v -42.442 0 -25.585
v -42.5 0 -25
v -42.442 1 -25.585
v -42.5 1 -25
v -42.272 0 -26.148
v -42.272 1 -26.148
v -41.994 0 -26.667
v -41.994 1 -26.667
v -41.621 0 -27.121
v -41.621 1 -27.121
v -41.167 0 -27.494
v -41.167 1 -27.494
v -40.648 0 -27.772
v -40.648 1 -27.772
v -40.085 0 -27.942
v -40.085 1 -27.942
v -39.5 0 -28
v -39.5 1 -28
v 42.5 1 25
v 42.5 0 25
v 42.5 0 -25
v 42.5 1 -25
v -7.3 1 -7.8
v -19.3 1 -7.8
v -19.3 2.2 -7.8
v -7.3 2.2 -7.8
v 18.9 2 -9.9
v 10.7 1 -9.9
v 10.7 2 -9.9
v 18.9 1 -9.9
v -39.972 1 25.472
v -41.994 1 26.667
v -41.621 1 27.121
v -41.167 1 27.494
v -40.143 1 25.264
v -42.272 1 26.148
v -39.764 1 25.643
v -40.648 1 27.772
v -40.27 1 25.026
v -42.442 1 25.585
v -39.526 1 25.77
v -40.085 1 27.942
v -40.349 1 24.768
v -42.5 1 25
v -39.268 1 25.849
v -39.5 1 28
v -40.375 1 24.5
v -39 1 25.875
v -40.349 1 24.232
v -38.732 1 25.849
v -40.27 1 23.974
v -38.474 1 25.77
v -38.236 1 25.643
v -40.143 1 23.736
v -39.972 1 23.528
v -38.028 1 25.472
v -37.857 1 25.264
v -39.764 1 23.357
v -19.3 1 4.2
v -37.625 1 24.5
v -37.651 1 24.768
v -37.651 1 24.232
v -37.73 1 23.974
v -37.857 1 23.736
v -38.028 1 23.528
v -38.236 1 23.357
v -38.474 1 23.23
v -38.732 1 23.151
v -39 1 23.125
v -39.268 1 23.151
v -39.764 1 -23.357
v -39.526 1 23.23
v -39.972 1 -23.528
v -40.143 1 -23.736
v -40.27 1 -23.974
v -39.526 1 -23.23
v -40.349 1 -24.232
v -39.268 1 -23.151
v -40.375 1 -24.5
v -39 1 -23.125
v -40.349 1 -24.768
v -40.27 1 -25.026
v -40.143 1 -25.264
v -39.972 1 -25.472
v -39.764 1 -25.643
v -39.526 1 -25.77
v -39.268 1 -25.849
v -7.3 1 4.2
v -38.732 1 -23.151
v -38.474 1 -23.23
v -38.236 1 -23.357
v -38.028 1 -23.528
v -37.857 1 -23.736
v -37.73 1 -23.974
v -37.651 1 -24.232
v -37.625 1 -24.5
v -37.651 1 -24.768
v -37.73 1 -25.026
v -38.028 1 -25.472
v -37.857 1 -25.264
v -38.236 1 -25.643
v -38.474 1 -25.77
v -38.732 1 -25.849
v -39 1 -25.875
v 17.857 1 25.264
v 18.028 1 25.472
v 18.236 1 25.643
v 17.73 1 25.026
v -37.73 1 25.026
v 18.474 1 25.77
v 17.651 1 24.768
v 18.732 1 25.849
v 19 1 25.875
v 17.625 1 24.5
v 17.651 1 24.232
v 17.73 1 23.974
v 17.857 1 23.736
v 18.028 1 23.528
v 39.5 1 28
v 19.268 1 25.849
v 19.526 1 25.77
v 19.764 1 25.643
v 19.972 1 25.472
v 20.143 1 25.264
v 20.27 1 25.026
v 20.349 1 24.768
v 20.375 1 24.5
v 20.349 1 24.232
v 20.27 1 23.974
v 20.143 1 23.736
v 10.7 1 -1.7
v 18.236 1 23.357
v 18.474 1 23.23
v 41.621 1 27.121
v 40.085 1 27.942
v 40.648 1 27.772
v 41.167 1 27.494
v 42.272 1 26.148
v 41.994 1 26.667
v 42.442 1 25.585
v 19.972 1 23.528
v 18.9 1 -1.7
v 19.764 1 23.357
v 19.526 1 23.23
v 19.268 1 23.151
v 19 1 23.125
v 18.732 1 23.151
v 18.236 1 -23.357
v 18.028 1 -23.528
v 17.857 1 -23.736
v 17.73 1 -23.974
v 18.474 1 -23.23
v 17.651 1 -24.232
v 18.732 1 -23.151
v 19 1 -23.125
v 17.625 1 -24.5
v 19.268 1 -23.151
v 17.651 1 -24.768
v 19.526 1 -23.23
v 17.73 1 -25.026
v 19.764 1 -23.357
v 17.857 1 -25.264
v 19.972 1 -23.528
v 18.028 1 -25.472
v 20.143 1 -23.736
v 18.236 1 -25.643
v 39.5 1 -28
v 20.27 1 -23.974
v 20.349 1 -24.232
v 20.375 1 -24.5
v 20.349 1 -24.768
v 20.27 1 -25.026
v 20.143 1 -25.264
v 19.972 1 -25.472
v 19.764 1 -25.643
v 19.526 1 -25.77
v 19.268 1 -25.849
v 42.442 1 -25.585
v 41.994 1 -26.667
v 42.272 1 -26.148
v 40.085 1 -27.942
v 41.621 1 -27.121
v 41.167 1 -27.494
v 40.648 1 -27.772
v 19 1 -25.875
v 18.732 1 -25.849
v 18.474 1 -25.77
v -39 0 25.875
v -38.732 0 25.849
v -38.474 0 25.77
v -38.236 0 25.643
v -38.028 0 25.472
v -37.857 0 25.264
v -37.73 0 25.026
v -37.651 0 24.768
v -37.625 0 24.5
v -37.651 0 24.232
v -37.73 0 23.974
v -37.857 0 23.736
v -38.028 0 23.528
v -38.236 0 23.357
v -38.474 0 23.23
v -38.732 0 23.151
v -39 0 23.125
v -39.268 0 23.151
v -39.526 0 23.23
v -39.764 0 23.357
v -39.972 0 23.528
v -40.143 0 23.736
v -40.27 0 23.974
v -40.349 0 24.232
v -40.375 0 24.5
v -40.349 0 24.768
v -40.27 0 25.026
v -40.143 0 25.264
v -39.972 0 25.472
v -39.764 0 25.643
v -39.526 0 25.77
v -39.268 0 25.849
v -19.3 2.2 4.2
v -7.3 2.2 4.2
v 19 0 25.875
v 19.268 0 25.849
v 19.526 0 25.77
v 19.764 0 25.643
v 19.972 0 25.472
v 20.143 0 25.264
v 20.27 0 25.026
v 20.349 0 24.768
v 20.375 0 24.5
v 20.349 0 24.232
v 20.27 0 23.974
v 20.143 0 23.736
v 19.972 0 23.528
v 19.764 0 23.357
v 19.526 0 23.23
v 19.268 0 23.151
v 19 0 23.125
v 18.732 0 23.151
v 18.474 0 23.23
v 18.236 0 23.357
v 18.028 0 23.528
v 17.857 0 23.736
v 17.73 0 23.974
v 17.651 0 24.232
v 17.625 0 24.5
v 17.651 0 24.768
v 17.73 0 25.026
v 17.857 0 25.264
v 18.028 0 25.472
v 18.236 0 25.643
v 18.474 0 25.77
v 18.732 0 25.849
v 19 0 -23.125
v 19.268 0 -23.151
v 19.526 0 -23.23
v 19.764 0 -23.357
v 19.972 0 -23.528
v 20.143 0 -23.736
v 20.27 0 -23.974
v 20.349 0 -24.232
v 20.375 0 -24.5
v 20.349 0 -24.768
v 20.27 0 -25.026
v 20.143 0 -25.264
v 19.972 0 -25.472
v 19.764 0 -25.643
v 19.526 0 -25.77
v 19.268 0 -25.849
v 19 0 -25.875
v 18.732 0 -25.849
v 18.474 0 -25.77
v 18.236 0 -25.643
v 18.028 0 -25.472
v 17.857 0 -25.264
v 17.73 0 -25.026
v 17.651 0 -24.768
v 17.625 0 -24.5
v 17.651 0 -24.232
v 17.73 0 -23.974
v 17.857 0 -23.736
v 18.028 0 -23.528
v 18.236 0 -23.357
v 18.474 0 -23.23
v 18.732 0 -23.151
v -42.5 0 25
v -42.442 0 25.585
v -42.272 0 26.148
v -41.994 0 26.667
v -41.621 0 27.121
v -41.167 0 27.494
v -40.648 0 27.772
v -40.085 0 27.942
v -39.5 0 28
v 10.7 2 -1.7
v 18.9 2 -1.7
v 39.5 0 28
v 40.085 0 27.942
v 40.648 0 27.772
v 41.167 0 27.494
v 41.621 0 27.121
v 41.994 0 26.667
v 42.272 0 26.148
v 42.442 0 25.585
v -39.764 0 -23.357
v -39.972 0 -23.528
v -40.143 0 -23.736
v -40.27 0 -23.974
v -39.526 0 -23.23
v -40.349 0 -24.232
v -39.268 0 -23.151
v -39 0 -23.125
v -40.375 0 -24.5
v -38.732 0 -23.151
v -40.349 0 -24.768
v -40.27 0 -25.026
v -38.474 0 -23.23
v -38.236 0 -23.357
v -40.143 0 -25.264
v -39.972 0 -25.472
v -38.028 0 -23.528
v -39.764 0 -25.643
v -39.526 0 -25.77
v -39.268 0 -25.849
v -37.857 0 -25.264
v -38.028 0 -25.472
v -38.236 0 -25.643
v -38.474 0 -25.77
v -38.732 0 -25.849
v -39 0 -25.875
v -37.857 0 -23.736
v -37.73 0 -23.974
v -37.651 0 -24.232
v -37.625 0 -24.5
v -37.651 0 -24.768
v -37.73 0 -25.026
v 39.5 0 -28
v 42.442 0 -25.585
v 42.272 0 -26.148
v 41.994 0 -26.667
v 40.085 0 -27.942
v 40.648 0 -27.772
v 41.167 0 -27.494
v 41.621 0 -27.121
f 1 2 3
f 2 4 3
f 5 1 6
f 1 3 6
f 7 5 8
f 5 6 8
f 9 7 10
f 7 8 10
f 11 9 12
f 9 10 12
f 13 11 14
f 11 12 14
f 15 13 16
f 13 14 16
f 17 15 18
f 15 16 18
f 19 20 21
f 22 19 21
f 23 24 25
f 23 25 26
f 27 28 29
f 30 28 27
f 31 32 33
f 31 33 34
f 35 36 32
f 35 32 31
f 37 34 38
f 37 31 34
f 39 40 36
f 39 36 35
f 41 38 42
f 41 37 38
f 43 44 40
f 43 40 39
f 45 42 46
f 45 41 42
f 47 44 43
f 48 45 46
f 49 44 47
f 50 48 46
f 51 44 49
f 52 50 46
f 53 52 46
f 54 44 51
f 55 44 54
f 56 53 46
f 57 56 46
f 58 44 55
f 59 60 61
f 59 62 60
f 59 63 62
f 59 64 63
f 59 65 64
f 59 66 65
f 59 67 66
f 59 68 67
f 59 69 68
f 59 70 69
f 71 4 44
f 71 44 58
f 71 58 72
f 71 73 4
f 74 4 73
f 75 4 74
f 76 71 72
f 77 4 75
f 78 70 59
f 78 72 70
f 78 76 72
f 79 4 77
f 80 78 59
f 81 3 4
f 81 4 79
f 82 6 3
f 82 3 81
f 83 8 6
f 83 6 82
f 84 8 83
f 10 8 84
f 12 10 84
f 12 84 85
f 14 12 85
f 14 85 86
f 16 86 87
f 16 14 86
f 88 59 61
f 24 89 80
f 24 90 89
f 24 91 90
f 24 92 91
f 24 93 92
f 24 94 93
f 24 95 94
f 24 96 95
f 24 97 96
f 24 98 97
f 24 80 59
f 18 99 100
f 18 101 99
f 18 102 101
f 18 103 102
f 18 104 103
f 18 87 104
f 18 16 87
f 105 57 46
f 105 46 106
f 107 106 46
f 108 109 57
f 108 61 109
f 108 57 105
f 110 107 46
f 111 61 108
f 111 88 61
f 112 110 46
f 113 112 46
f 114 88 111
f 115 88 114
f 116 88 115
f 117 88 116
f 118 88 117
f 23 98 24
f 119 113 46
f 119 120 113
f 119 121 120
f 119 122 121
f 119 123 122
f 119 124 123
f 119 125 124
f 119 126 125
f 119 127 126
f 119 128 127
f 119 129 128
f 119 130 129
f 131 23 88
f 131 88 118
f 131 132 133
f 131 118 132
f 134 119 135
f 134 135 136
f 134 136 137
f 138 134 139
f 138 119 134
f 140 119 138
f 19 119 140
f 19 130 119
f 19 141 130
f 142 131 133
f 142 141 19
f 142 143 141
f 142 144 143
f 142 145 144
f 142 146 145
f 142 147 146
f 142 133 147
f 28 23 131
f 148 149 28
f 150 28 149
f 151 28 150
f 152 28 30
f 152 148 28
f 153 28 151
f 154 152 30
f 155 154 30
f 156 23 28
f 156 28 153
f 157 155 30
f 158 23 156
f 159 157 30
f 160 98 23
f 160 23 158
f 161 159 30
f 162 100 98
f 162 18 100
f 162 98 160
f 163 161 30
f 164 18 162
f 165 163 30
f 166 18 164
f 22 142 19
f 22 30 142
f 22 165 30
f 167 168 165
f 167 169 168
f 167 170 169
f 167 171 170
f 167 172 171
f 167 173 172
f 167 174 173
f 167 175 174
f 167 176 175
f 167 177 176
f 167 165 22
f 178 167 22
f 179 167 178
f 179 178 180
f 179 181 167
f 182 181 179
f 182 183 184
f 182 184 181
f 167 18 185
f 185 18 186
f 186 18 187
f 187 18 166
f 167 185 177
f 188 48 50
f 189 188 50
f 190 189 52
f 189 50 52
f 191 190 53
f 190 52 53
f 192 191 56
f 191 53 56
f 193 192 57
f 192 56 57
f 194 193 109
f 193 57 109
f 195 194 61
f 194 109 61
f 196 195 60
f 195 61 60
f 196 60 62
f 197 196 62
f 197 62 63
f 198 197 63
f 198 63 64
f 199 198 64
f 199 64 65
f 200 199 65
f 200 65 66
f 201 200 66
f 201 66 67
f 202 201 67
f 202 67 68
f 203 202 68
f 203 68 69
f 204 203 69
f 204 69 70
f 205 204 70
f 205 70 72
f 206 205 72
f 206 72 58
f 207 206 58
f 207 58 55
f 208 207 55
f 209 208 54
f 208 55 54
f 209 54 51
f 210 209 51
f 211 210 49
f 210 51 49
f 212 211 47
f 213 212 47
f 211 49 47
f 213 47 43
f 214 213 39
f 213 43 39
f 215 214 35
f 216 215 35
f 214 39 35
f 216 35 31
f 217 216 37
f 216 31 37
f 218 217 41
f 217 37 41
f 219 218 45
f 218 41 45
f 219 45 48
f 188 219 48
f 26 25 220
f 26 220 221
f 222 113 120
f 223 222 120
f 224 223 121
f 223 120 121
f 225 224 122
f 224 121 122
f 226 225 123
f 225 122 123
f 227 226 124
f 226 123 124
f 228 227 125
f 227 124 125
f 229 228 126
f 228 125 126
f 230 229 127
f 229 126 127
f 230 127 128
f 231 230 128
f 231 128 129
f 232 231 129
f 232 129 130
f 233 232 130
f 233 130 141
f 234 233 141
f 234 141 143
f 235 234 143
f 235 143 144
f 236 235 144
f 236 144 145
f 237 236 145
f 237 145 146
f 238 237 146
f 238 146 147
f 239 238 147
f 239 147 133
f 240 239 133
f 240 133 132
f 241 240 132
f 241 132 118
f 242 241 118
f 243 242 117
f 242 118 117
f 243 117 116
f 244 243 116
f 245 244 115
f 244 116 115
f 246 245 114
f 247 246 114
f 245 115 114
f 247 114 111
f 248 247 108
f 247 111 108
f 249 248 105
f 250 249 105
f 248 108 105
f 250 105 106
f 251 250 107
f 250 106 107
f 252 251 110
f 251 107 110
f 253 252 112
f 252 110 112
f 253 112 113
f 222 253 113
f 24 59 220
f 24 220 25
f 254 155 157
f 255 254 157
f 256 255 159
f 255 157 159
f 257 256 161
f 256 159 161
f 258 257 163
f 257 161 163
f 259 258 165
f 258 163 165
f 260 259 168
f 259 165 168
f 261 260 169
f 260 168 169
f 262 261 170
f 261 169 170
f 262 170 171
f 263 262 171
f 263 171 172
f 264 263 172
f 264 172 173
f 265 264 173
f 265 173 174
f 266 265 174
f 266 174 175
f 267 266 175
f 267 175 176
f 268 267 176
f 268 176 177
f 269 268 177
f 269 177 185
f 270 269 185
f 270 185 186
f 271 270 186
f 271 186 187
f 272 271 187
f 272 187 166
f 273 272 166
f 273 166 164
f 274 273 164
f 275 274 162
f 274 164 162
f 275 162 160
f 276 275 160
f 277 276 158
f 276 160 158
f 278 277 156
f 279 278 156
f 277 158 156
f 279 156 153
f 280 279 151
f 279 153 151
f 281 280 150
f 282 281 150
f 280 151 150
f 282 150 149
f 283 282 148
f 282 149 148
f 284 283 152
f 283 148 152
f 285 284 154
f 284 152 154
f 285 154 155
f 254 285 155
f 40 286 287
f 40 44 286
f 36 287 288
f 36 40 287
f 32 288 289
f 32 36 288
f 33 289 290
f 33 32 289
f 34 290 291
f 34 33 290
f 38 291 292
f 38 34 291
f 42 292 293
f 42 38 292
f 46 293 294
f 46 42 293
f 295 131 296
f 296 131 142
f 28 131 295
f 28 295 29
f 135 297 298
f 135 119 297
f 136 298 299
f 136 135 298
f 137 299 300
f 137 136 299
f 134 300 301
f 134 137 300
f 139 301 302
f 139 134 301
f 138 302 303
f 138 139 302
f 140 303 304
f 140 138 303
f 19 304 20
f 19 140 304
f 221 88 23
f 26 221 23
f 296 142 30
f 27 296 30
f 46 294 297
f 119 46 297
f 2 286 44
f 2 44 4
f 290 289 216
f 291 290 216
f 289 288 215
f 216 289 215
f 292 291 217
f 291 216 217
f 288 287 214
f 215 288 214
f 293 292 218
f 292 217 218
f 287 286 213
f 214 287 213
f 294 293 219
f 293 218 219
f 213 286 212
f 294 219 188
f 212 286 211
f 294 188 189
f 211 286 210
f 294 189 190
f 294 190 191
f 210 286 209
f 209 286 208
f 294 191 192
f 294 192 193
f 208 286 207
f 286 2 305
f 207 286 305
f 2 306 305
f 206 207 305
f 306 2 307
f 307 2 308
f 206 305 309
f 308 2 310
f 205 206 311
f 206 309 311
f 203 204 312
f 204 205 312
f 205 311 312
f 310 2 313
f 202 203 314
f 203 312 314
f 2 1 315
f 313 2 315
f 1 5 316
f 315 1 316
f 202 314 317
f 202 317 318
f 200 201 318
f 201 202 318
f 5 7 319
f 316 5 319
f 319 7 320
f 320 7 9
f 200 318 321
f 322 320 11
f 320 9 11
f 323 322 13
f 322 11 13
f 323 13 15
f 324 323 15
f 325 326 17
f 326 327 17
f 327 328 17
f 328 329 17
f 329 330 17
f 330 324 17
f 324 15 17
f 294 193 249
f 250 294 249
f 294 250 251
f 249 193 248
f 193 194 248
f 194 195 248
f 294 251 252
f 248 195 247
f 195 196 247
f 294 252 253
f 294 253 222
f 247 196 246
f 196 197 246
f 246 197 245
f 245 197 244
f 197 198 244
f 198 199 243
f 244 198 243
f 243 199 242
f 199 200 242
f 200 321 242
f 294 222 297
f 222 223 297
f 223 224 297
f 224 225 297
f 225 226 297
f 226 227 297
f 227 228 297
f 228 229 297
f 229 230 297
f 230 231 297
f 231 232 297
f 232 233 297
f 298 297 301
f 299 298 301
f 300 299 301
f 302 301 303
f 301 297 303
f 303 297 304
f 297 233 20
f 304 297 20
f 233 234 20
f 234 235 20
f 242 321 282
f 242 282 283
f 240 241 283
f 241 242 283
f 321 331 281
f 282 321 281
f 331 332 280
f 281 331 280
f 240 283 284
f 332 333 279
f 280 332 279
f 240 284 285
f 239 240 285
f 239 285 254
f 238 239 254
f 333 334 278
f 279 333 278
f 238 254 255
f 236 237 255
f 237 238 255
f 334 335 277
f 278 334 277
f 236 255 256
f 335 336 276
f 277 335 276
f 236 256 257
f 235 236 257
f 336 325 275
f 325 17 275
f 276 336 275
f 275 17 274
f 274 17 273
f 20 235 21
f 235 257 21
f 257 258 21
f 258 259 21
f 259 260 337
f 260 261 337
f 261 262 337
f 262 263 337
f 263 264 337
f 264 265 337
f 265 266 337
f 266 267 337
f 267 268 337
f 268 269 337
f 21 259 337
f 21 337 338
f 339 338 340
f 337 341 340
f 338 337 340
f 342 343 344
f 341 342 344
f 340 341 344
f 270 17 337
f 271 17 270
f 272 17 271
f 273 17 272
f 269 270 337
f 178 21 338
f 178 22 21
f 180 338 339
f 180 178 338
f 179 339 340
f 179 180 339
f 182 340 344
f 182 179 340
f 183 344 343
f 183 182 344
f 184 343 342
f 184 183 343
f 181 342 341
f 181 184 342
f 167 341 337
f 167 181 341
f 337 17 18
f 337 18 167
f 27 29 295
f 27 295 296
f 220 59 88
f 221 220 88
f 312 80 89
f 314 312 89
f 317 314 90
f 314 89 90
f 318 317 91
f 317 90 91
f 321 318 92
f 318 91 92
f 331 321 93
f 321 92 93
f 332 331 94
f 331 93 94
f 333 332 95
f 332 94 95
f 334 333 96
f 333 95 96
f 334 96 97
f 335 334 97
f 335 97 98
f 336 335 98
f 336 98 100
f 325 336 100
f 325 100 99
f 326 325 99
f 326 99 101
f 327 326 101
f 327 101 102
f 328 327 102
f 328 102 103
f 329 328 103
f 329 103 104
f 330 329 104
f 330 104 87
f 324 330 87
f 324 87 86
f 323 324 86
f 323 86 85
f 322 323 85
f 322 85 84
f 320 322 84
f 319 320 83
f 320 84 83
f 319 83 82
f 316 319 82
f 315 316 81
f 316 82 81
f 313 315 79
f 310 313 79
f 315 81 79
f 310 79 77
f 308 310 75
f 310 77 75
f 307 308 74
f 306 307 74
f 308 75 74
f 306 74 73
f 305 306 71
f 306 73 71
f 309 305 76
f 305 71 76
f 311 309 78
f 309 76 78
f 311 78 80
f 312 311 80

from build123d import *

# Parameters (mm, degrees)
SKETCH_1_W          = 85
SKETCH_1_H          = 56
EXTRUDE_1_DEPTH     = 1
FILLET_1_R          = 3
SKETCH_2_R          = 1.375
CUT_EXTRUDE_1_DEPTH = 51.904322017
SKETCH_3_W          = 12
SKETCH_3_H          = 12
EXTRUDE_2_DEPTH     = 1.2
SKETCH_4_W          = 8.2
SKETCH_4_H          = 8.2
EXTRUDE_3_DEPTH     = 1


with BuildPart() as part:
    # Эскиз1 → Бобышка-Вытянуть1 (new body)
    with BuildSketch(Plane(origin=(0, 0, 0), x_dir=(1, 0, 0), z_dir=(0, 1, 0))):
        Rectangle(SKETCH_1_W, SKETCH_1_H)
    extrude(amount=EXTRUDE_1_DEPTH)

    # Скругление1
    fillet_1_edges = [part.edges().sort_by_distance(p)[0] for p in [
        (-42.5, 0.5, -28),
        (42.5, 0.5, -28),
        (42.5, 0.5, 28),
        (-42.5, 0.5, 28),
    ]]
    fillet(fillet_1_edges, radius=FILLET_1_R)

    # Эскиз2 → Вырез-Вытянуть1 (cut, through all)
    with BuildSketch(Plane(origin=(0, 1, 0), x_dir=(1, 0, 0), z_dir=(0, 1, 0))):
        with Locations(Location((19, 24.5, 0), (0, 0, 270))):
            Circle(SKETCH_2_R)
        with Locations(Location((-39, 24.5, 0), (0, 0, 270))):
            Circle(SKETCH_2_R)
        with Locations(Location((-39, -24.5, 0), (0, 0, 270))):
            Circle(SKETCH_2_R)
        with Locations(Location((19, -24.5, 0), (0, 0, 270))):
            Circle(SKETCH_2_R)
    extrude(amount=-CUT_EXTRUDE_1_DEPTH, mode=Mode.SUBTRACT)

    # Эскиз3 → Бобышка-Вытянуть2 (add)
    with BuildSketch(Plane(origin=(0, 1, 0), x_dir=(1, 0, 0), z_dir=(0, 1, 0))):
        with Locations((-13.3, 1.8)):
            Rectangle(SKETCH_3_W, SKETCH_3_H)
    extrude(amount=EXTRUDE_2_DEPTH)

    # Эскиз4 → Бобышка-Вытянуть3 (add)
    with BuildSketch(Plane(origin=(0, 1, 0), x_dir=(1, 0, 0), z_dir=(0, 1, 0))):
        with Locations((14.8, 5.8)):
            Rectangle(SKETCH_4_W, SKETCH_4_H)
    extrude(amount=EXTRUDE_3_DEPTH)


solid = part.part
